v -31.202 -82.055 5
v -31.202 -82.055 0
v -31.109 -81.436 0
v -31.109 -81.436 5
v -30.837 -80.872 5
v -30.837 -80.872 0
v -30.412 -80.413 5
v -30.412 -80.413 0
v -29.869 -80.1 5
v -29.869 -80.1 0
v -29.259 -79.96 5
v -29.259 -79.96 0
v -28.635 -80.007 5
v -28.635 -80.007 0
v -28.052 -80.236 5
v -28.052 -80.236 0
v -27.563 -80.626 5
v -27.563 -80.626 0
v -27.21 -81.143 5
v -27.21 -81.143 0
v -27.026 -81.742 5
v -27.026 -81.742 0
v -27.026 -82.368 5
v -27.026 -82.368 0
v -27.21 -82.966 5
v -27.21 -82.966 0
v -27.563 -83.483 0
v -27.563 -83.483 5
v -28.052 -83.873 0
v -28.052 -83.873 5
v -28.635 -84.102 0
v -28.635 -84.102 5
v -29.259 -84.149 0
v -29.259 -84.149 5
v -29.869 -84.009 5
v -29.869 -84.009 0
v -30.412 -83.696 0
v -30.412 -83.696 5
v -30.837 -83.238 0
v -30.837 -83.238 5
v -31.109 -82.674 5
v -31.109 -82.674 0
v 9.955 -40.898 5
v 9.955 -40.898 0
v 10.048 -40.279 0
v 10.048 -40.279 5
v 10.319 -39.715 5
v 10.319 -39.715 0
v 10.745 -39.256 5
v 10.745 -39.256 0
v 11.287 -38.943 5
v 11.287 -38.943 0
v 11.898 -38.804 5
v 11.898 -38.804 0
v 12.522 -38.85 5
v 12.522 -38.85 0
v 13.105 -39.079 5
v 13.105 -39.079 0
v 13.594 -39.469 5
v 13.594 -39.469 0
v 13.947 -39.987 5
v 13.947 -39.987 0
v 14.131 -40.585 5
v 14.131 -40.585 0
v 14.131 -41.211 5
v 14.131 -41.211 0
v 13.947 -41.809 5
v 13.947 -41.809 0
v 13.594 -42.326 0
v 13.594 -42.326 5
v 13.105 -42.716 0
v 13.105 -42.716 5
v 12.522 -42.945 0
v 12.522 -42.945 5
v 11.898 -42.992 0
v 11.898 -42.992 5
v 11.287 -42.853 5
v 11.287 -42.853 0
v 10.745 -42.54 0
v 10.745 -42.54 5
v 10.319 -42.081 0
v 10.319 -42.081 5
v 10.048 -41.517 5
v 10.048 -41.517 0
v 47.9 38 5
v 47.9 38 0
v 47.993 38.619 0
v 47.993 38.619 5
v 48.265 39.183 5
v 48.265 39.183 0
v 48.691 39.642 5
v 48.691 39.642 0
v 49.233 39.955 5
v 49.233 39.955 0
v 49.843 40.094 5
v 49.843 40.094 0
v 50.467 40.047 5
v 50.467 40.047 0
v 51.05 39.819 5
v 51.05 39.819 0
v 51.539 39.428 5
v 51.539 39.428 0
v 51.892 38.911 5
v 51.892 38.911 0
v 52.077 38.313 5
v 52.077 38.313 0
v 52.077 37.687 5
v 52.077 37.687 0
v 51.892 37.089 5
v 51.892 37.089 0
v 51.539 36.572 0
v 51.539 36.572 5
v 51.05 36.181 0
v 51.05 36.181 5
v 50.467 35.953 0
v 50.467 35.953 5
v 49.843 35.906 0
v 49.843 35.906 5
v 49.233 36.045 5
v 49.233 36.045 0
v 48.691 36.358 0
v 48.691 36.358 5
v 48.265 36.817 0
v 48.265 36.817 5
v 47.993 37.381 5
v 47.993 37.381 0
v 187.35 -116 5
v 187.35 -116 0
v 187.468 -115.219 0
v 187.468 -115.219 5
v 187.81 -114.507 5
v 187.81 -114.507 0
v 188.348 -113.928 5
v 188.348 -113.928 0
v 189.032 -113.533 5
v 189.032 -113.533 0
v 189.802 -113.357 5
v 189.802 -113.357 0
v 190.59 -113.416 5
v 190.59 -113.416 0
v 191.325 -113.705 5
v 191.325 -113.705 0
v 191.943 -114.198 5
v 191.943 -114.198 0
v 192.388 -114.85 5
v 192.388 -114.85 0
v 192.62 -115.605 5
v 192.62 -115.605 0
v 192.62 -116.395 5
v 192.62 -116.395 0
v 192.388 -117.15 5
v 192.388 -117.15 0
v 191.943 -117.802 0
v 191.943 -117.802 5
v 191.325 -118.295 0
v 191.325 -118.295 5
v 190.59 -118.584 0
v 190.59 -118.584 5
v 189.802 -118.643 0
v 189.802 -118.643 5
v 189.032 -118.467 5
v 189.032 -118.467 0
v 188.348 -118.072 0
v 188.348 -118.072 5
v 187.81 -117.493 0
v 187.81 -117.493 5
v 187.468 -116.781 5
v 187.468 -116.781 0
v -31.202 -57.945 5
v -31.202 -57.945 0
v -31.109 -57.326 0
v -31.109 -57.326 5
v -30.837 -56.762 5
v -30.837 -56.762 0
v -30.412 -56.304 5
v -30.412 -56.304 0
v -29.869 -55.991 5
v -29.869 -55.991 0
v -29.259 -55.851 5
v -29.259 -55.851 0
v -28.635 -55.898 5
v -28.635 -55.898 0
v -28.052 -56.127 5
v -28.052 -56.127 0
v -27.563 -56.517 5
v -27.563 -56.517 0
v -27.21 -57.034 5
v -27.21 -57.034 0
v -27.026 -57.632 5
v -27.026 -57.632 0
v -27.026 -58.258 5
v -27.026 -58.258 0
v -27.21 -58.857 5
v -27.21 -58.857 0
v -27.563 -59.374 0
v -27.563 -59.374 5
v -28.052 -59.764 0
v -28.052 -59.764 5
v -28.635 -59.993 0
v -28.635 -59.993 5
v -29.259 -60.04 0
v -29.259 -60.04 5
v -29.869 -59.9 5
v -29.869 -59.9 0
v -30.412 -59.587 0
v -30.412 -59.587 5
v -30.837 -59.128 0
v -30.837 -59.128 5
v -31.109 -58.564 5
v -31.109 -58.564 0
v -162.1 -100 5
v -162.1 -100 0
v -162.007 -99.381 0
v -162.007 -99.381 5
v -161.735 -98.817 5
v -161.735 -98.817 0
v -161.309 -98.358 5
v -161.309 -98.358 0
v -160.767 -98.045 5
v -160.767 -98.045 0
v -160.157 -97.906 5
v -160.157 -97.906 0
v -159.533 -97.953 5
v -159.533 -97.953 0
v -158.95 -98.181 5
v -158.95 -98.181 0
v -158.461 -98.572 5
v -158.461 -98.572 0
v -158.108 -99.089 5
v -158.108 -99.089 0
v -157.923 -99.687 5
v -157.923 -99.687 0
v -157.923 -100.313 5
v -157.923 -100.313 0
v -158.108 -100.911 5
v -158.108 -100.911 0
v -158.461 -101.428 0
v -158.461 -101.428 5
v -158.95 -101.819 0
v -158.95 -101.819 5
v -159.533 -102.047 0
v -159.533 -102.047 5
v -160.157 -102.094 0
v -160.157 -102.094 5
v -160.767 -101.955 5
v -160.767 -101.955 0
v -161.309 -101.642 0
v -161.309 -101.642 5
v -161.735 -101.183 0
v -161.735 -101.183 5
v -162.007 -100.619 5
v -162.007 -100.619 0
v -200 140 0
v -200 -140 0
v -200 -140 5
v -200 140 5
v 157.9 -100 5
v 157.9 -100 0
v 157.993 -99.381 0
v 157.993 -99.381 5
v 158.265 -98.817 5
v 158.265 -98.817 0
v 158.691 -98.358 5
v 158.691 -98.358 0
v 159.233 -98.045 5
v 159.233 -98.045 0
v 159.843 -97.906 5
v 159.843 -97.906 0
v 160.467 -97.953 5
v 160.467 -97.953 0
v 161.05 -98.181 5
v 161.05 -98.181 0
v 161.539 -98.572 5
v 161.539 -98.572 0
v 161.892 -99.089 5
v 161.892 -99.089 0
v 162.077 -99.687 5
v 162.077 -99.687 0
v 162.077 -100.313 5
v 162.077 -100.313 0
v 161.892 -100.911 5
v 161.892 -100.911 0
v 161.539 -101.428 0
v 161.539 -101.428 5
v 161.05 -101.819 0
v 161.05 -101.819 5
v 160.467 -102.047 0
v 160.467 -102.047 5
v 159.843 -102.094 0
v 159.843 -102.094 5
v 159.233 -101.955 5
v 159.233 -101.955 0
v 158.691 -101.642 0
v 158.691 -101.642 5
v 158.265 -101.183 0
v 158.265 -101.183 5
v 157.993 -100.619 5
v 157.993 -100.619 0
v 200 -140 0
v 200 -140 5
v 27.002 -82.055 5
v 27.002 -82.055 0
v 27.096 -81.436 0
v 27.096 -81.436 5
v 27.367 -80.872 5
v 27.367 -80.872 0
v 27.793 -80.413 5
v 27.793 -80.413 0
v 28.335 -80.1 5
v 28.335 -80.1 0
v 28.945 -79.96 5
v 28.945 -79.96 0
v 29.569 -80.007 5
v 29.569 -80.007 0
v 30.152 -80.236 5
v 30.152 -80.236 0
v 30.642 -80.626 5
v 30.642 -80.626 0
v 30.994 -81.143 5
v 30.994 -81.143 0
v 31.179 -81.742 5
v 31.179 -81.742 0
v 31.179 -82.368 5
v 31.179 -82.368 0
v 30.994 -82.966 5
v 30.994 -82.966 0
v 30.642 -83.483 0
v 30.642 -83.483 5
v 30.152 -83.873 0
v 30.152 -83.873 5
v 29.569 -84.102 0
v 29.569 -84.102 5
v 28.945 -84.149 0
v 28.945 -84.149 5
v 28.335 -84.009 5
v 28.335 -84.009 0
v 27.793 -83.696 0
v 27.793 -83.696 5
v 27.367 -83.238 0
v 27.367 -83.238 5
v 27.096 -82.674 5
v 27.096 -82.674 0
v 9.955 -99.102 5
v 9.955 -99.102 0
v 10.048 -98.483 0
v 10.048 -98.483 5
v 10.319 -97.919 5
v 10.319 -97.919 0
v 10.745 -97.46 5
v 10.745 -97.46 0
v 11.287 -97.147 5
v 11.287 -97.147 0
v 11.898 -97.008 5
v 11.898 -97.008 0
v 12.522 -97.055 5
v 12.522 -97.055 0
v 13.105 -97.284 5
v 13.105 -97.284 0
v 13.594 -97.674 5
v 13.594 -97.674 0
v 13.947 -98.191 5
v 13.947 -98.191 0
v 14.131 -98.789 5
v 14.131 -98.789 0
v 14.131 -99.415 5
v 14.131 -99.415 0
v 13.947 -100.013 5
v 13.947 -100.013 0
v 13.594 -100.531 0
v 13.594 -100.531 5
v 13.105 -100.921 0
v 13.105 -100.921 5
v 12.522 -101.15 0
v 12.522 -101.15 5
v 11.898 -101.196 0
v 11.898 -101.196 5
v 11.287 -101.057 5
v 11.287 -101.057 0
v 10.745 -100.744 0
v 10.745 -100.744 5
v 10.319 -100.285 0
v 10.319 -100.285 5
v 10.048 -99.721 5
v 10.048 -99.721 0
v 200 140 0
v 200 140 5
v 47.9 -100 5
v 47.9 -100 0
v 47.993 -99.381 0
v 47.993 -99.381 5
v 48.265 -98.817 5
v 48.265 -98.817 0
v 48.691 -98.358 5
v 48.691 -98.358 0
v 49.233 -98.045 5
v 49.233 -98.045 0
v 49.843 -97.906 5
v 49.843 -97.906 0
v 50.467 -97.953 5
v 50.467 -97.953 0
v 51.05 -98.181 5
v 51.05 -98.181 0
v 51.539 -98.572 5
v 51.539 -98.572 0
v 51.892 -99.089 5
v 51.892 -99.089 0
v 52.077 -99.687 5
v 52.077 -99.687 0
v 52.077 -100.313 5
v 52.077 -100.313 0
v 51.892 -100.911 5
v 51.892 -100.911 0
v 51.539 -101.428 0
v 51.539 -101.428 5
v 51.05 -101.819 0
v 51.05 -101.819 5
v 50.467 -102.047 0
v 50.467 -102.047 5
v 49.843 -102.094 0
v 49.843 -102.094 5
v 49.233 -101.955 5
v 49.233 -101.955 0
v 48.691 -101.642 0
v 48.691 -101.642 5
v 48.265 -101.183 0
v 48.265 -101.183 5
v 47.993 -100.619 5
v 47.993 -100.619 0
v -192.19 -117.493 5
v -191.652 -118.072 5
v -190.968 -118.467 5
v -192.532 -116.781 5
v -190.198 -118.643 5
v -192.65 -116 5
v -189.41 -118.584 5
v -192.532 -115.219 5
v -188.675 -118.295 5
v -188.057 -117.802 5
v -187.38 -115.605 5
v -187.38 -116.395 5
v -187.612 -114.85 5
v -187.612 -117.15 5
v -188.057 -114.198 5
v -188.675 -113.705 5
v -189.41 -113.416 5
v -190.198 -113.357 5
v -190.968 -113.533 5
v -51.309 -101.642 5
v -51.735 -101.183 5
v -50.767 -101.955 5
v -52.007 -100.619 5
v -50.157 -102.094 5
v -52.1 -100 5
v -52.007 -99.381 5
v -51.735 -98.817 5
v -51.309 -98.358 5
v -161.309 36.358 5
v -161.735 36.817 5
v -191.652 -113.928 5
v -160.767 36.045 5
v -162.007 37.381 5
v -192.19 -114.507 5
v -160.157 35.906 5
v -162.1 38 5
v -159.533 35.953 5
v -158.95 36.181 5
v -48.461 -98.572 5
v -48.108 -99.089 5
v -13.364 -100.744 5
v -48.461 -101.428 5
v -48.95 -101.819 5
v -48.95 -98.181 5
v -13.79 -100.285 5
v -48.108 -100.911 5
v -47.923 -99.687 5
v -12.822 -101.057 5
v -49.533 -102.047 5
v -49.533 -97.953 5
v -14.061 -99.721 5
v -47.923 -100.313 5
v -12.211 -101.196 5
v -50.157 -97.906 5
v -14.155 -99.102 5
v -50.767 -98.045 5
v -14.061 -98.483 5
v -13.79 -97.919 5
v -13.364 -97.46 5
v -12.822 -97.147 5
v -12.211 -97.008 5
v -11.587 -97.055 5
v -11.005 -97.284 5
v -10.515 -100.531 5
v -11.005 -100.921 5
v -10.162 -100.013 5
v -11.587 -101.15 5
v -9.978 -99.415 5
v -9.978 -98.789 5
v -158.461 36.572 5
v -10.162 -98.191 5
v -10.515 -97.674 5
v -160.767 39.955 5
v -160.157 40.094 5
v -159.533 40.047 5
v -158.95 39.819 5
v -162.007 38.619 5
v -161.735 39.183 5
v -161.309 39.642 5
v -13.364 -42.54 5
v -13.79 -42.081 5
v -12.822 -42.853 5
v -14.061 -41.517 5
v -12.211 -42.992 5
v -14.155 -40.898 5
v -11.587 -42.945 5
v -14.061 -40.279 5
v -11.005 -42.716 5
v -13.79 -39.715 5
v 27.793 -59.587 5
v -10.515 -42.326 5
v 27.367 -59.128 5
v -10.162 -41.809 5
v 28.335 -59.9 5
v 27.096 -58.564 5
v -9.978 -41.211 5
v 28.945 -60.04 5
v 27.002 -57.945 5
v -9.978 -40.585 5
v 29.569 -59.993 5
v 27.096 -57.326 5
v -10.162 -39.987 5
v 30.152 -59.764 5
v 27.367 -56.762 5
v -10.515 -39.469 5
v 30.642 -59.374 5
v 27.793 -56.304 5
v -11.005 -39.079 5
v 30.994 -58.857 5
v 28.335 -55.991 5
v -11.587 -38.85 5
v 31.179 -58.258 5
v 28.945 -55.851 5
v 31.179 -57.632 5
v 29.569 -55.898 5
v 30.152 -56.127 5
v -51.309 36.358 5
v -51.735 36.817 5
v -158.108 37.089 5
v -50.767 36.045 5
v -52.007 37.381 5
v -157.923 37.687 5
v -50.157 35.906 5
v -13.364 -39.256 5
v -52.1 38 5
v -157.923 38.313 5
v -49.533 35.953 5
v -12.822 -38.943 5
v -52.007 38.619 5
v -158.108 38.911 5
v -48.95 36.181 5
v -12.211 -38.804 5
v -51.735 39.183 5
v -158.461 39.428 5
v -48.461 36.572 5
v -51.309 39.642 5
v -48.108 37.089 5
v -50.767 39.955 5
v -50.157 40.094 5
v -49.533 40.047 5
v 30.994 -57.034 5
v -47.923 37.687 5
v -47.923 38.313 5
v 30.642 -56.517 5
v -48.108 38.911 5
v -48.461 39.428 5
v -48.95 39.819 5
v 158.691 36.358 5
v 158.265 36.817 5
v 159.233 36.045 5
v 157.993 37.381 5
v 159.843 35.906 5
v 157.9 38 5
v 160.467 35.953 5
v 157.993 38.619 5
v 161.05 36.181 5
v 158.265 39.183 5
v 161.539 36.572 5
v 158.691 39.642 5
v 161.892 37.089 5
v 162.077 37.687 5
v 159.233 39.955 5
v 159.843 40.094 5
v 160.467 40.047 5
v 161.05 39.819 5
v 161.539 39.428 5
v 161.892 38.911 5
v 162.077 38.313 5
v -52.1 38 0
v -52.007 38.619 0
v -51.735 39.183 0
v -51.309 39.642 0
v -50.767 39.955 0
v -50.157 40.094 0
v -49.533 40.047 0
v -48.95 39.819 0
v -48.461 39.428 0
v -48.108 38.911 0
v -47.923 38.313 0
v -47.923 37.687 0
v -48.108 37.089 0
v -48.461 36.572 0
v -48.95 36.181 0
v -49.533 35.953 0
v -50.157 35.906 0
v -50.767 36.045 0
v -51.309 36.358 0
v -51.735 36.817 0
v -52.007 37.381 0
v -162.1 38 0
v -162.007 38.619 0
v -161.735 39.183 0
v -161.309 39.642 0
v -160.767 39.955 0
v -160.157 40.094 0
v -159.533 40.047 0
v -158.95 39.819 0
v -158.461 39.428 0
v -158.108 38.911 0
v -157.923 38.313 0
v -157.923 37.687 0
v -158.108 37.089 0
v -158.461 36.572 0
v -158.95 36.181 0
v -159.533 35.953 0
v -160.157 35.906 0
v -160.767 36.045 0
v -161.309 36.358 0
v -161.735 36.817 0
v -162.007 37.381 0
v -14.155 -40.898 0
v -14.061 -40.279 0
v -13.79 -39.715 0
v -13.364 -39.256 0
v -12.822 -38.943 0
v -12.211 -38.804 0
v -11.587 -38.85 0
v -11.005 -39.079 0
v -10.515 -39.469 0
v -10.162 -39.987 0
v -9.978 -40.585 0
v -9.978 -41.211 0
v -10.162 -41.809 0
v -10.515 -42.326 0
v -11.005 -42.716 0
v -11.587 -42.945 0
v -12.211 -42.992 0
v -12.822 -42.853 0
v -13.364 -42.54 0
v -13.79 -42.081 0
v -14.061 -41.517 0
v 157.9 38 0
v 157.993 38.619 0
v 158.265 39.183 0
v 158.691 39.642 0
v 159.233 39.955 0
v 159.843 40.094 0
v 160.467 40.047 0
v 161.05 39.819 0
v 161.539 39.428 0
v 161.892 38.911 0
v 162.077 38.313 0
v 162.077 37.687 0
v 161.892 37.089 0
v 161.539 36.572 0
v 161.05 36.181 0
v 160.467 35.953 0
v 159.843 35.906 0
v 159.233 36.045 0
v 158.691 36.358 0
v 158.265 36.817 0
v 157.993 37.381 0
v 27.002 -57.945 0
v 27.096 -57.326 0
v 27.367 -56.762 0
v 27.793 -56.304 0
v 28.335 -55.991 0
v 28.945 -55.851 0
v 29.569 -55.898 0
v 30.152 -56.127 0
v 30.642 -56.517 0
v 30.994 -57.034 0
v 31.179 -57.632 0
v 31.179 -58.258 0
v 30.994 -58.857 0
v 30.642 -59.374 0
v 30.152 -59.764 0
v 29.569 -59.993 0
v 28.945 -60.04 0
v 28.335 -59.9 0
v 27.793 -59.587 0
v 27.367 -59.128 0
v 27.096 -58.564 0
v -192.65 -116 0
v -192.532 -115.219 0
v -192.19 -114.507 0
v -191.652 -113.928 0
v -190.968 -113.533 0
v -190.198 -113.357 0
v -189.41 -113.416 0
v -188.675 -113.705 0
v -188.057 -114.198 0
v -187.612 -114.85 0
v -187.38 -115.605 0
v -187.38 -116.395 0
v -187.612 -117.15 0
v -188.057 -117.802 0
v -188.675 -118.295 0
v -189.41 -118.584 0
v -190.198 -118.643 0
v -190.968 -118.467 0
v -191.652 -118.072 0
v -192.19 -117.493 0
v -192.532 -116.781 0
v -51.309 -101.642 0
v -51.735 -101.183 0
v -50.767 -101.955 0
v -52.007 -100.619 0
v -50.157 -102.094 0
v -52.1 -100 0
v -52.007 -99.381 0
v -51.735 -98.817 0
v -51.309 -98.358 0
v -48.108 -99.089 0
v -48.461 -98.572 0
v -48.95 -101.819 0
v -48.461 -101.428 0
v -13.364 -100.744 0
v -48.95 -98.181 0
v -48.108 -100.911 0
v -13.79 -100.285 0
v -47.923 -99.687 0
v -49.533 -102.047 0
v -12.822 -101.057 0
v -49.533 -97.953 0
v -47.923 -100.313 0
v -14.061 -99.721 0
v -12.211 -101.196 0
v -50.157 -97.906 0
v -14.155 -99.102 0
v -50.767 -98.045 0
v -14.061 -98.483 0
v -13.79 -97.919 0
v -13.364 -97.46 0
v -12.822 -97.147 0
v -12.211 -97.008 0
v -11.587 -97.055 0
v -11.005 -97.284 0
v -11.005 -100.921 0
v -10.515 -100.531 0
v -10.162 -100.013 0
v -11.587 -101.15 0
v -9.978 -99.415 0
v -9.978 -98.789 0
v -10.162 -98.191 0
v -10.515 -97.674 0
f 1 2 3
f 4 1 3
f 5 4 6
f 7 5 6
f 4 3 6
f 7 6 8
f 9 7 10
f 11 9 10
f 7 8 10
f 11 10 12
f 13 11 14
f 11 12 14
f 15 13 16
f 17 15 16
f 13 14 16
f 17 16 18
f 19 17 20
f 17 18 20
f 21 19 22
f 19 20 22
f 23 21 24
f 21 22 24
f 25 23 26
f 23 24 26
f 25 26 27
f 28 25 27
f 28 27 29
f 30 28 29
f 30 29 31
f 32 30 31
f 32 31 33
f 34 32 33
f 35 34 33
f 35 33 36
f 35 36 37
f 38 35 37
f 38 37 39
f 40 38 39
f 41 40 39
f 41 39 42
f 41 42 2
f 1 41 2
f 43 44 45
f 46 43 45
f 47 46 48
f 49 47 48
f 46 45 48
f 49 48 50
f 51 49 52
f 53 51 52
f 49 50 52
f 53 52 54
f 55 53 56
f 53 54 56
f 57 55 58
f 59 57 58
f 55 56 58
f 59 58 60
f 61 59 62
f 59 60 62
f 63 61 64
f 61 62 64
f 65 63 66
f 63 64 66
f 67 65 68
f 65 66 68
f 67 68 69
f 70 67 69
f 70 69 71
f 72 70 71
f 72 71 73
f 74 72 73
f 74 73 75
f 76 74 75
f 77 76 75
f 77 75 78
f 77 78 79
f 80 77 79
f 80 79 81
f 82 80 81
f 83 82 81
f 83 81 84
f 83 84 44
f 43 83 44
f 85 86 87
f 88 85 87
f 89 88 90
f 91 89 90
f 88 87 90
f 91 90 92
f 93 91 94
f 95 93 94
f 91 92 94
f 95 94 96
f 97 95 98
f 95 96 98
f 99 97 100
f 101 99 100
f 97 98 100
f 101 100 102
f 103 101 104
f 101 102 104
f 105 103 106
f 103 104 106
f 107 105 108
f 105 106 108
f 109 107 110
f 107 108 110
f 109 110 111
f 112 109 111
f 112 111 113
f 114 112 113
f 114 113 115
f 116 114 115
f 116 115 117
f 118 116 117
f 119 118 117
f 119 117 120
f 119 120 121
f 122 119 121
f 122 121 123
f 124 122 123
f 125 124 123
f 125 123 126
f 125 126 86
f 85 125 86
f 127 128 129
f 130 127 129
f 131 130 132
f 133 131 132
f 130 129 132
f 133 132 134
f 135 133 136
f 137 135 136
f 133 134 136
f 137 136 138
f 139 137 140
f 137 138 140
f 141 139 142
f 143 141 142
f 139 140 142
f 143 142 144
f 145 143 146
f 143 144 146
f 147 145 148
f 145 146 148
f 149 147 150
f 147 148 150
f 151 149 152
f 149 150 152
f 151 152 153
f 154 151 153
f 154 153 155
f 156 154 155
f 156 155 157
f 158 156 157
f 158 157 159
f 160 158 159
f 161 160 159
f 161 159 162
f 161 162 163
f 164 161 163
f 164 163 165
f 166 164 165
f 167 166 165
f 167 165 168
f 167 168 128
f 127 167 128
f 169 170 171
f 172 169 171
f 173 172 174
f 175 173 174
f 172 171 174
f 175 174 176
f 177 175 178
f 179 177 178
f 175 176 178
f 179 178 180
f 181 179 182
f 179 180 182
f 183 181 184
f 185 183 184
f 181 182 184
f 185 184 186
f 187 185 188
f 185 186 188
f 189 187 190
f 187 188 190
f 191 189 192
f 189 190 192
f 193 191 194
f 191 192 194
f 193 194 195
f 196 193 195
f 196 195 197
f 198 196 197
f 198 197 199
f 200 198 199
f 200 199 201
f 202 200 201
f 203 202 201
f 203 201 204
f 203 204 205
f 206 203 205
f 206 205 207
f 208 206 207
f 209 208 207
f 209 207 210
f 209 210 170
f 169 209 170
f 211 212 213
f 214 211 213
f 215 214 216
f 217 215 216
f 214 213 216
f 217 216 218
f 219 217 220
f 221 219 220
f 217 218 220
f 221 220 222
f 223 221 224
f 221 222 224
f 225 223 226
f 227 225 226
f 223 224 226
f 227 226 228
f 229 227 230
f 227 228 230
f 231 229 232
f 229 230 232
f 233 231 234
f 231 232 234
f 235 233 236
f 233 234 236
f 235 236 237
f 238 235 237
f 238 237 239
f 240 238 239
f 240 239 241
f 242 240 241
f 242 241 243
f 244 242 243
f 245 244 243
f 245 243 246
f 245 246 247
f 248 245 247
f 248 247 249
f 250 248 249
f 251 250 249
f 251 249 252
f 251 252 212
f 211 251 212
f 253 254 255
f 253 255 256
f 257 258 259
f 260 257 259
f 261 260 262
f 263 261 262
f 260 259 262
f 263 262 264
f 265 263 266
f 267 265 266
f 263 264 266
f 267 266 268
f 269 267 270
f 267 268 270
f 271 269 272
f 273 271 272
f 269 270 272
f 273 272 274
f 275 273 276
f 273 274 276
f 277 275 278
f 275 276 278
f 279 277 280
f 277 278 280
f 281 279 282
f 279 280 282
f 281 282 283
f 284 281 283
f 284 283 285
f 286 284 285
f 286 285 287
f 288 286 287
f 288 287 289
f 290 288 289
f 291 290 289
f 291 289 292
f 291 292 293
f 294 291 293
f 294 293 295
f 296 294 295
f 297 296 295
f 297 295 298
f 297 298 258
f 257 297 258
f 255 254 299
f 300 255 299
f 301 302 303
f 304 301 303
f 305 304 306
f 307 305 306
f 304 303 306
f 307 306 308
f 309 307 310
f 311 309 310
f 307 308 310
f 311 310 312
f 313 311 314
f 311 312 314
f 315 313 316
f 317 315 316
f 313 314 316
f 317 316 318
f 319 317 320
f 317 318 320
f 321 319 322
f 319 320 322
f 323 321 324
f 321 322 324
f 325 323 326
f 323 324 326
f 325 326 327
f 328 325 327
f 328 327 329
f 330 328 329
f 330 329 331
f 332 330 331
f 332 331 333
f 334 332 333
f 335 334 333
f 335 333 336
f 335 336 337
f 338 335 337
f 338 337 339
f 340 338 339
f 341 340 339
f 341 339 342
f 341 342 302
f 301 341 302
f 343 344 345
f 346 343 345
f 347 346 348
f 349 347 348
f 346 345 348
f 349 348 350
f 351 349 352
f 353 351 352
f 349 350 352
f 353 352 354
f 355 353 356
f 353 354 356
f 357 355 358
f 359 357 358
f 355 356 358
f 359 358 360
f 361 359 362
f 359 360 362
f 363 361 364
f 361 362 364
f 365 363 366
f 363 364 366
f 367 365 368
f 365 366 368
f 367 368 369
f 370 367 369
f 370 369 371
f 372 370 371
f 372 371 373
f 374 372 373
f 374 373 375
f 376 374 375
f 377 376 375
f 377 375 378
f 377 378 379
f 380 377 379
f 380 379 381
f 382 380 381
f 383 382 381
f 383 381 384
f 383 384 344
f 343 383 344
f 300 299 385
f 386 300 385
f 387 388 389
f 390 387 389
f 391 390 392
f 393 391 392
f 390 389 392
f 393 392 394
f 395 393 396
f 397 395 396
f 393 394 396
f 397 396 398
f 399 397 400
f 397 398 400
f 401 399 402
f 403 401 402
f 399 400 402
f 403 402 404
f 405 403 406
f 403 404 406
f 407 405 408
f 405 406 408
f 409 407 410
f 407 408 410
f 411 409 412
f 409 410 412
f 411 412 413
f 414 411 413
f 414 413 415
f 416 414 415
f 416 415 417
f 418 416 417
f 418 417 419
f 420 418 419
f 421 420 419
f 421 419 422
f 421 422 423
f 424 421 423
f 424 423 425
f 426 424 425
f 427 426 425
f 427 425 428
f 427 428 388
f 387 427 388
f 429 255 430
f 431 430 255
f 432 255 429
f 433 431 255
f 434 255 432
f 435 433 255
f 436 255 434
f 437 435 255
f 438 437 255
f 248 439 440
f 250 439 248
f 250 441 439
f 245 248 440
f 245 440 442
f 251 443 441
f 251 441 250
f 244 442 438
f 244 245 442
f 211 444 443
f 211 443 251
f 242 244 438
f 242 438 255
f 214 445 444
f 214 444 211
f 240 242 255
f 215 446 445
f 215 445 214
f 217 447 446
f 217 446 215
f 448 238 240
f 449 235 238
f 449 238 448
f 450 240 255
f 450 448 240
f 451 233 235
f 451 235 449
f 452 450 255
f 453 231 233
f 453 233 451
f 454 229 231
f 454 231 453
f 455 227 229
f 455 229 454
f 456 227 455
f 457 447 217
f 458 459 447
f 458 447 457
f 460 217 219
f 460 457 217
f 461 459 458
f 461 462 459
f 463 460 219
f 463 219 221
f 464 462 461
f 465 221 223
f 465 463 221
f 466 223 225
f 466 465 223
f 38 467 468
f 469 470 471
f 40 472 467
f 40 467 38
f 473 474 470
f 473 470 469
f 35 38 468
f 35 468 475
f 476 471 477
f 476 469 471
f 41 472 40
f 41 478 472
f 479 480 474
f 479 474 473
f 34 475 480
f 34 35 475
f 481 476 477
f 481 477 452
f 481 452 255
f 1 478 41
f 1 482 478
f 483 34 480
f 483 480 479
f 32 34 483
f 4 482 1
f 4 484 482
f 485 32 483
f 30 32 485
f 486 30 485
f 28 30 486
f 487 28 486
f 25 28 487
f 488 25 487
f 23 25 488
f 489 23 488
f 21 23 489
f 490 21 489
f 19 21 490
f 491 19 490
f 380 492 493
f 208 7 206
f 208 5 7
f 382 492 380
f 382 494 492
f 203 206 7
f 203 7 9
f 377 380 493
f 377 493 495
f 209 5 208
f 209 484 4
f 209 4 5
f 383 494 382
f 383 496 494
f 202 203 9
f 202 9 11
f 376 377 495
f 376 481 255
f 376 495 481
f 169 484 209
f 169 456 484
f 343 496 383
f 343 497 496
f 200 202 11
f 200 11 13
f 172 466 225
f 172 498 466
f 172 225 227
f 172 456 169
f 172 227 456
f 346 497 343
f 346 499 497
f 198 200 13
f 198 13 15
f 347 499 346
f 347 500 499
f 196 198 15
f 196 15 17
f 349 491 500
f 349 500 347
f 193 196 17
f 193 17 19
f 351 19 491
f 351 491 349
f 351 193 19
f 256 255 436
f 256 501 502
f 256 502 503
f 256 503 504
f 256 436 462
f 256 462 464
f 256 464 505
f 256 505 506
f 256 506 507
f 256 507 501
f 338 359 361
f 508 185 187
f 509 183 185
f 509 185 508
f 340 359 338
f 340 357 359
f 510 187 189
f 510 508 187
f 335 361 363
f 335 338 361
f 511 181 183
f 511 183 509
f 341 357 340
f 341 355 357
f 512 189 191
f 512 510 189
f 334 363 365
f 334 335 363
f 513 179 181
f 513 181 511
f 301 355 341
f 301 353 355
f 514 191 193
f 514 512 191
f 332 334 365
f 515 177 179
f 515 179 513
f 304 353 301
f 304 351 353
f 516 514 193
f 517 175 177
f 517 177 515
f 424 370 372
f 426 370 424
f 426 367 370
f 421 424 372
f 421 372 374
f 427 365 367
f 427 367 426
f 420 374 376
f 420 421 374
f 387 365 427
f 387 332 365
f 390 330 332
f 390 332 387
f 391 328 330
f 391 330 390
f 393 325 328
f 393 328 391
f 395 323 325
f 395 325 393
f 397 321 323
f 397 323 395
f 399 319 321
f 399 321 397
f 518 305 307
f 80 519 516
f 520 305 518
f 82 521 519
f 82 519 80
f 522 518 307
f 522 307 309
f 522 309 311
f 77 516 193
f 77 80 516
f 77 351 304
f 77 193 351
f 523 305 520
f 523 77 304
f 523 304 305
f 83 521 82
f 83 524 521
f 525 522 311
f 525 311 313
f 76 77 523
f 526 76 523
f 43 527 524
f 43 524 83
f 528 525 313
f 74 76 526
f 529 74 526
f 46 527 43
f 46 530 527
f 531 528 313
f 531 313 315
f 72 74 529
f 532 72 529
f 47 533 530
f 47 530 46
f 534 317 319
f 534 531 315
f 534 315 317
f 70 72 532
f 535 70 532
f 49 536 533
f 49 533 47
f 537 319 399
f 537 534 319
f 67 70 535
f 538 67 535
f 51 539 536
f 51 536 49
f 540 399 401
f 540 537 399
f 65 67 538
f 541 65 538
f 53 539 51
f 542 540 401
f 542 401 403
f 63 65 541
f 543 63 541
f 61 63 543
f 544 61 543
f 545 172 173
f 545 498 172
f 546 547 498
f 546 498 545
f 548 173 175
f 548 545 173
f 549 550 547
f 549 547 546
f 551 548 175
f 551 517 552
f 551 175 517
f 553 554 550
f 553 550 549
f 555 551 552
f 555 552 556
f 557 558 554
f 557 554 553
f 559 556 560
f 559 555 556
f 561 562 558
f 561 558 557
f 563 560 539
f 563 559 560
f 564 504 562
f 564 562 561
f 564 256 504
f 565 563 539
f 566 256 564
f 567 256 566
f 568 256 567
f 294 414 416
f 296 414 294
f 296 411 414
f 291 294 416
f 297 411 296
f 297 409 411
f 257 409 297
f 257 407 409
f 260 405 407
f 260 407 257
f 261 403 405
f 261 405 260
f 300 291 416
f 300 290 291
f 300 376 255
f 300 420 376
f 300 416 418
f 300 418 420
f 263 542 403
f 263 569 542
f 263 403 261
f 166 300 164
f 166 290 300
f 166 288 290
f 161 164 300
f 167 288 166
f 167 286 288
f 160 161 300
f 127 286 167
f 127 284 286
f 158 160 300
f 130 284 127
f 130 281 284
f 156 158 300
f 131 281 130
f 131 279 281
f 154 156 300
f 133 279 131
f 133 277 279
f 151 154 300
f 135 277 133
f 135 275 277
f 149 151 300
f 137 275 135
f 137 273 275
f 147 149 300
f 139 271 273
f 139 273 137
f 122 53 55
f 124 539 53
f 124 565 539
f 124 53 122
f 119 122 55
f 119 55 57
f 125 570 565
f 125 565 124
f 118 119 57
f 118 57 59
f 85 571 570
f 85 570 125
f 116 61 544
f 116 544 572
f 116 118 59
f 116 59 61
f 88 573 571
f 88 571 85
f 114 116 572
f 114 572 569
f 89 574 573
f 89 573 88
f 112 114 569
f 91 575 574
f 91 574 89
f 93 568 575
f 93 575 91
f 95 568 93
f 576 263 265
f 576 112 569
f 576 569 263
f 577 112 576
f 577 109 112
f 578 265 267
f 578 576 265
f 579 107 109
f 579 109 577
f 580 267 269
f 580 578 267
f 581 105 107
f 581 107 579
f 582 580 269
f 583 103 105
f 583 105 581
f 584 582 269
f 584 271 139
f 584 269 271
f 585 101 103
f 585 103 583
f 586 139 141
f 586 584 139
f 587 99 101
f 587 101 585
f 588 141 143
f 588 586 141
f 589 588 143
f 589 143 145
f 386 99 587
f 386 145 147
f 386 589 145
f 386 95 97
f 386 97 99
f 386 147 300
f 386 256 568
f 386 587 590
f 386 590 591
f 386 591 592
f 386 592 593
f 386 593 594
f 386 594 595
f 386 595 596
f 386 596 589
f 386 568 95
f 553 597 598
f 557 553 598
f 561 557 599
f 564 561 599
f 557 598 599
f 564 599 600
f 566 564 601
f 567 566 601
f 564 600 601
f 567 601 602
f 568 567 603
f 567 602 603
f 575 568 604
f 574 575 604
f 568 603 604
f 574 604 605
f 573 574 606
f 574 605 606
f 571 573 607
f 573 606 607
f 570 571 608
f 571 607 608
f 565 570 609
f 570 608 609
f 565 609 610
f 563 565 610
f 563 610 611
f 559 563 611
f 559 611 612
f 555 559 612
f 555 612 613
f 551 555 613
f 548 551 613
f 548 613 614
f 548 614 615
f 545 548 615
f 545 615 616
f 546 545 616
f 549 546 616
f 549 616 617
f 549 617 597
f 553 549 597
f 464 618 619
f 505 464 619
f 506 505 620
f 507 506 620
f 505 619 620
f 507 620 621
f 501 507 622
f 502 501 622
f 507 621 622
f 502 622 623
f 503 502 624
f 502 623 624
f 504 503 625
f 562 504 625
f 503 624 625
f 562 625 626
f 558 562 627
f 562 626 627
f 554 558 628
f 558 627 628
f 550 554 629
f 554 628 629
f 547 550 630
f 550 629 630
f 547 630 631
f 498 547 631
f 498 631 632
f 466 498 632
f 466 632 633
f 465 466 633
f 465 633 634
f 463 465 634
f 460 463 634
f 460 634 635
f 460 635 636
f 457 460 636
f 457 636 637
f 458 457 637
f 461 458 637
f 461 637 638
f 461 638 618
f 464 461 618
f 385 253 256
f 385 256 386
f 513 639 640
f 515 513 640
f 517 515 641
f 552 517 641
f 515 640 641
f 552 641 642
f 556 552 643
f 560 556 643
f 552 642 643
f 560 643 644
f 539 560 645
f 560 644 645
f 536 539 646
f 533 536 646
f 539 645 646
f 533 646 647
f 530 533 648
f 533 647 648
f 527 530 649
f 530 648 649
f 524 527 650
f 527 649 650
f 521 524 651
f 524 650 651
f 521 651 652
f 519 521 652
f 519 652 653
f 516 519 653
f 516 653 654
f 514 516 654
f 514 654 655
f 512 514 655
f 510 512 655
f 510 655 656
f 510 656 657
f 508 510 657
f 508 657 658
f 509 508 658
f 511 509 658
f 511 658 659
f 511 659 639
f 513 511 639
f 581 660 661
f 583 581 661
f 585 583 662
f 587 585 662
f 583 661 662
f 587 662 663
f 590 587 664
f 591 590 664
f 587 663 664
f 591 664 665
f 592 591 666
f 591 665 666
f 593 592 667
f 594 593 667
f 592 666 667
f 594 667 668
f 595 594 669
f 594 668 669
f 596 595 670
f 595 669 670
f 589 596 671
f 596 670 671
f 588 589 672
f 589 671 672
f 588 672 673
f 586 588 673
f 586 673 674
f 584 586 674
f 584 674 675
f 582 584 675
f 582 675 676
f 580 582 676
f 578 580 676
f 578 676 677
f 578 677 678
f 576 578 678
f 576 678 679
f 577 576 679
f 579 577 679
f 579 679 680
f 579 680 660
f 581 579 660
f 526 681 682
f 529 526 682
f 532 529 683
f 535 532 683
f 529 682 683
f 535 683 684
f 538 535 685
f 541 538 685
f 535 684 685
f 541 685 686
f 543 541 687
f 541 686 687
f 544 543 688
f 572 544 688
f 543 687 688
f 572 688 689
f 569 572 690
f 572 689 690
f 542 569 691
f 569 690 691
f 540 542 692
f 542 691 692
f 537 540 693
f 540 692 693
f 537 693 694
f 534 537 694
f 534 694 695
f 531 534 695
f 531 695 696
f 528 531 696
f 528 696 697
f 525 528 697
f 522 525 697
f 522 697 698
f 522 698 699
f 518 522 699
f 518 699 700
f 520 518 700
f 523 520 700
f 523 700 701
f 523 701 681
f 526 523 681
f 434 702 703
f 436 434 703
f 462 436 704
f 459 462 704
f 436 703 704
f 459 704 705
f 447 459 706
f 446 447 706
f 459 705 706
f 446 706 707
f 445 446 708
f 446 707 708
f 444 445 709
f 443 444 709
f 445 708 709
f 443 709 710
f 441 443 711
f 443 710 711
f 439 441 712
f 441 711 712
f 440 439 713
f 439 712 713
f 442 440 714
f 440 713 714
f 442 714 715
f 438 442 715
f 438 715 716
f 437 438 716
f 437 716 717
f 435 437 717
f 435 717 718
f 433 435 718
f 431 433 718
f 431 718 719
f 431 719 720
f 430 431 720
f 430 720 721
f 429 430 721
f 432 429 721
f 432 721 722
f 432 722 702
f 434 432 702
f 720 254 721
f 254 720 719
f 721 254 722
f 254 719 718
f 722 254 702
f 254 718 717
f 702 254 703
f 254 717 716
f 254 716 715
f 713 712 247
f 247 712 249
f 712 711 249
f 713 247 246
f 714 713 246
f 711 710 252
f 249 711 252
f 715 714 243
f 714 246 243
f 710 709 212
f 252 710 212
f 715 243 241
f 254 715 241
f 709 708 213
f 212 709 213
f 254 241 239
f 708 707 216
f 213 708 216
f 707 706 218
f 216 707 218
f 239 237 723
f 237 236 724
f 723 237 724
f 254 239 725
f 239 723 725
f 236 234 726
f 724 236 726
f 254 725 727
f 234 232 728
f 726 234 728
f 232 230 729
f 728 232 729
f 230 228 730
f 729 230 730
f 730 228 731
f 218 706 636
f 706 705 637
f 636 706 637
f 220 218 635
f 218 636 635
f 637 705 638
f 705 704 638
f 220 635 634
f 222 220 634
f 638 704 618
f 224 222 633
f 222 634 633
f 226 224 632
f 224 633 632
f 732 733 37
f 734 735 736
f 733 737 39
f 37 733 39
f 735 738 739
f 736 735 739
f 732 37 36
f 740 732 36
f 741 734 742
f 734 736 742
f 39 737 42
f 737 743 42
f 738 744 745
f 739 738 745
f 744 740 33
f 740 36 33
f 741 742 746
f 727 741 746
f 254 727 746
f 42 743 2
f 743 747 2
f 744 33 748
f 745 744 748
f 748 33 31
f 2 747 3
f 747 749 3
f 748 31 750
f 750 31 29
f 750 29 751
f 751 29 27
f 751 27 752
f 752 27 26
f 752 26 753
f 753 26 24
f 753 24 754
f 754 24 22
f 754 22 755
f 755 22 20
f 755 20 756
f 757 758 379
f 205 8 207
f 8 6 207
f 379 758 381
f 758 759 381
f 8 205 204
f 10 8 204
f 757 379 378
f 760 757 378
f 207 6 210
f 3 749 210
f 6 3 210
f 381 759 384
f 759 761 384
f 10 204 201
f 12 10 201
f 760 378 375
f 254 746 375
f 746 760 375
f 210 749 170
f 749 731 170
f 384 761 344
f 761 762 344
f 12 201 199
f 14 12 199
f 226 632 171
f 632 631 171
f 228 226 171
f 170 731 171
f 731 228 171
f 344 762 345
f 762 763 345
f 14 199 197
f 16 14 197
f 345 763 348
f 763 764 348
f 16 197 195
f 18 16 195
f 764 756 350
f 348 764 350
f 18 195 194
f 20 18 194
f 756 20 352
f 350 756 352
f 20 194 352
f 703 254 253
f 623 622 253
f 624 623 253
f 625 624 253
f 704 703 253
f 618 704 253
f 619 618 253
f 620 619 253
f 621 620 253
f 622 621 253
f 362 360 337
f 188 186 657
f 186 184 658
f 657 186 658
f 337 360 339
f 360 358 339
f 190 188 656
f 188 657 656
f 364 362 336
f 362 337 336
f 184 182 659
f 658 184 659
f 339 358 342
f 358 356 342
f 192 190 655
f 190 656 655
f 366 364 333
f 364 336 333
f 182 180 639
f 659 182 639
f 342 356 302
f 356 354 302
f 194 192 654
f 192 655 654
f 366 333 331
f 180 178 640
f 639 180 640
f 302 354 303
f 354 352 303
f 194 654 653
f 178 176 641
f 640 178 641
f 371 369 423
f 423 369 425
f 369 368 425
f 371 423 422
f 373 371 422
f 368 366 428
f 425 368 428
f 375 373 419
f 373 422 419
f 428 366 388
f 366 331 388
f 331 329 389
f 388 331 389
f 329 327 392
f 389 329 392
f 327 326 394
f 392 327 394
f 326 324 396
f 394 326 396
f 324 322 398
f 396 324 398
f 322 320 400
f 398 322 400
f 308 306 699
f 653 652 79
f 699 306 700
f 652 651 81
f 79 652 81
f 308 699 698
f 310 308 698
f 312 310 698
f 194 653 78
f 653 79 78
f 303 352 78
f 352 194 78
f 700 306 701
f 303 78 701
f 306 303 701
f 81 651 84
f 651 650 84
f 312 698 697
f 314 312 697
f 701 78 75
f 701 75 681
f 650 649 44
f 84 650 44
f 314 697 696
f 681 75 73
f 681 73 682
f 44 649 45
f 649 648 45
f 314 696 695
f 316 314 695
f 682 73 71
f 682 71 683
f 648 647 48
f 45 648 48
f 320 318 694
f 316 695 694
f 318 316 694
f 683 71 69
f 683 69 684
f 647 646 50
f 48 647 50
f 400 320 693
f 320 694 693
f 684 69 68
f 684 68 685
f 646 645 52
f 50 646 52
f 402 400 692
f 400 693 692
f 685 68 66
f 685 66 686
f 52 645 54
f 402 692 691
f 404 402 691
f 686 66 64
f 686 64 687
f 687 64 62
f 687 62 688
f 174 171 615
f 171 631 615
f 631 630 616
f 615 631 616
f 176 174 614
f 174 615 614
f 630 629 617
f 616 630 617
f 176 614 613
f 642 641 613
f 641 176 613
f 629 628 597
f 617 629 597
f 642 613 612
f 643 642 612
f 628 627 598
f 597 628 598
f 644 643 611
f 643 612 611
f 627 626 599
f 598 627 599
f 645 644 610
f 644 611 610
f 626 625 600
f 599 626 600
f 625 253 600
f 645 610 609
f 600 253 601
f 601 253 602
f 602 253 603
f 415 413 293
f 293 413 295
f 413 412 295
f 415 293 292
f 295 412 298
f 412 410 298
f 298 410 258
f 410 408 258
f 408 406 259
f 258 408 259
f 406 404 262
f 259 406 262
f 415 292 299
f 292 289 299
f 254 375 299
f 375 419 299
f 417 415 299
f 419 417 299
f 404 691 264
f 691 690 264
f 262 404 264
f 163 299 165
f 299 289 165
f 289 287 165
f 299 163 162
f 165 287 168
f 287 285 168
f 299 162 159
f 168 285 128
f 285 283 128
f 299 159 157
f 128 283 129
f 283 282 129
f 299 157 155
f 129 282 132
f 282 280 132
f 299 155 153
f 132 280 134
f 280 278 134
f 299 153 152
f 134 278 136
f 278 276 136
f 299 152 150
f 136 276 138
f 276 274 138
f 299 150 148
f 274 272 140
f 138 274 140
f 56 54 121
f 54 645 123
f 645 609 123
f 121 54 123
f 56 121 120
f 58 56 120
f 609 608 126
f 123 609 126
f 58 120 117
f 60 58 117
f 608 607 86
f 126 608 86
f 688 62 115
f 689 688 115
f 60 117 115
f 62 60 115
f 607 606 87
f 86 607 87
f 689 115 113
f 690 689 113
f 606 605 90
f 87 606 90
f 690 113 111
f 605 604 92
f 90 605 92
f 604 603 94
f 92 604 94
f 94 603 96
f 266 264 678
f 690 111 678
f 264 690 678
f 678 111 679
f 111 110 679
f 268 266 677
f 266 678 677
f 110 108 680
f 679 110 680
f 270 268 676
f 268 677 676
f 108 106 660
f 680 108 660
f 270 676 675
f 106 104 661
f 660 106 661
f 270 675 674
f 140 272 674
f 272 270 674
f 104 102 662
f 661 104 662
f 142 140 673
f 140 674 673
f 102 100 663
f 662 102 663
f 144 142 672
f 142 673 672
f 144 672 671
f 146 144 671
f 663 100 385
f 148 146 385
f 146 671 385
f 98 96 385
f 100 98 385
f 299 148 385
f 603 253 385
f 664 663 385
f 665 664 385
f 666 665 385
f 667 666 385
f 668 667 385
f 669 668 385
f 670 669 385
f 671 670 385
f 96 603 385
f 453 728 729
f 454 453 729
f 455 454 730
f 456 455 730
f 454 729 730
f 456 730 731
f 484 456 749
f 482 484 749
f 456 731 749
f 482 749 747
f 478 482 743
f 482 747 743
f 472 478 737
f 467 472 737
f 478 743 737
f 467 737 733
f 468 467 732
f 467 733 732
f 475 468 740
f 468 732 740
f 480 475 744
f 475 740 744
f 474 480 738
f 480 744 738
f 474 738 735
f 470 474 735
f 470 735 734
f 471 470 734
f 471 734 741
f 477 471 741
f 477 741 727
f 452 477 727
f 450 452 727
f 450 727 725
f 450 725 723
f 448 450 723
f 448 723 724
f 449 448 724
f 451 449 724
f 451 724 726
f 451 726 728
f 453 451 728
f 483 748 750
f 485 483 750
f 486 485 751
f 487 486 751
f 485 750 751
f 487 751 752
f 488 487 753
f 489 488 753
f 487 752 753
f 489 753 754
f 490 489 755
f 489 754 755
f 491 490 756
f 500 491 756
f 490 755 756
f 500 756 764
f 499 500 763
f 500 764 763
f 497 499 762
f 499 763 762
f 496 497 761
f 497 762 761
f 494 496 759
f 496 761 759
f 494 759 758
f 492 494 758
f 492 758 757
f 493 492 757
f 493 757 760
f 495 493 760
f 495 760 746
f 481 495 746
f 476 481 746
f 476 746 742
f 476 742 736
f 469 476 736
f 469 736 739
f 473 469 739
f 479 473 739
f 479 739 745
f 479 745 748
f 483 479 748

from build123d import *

# Parameters (mm, degrees)
ESBO_O1_W                    = 400
ESBO_O1_H                    = 280
RESSALTO_EXTRUS_O1_DEPTH     = 5
FURO_DE_DI_METRO_4_2_4_2_2_D = 4.2
FURO_DE_DI_METRO_5_3_5_3_1_D = 5.3
FURO_DE_DI_METRO_4_2_4_2_1_D = 4.2


with BuildPart() as part:
    # Esboço1 → Ressalto-extrusão1 (new body)
    with BuildSketch(Plane.XY):
        Rectangle(ESBO_O1_W, ESBO_O1_H)
    extrude(amount=RESSALTO_EXTRUS_O1_DEPTH)

    # Furo de diâmetro Ø4.2 (4.2)2 (through all)
    with Locations(Plane(origin=(12.05452812, -40.897794726, 5), x_dir=(1, 0, 0), z_dir=(0, 0, 1))):
        with Locations((0, 0), (17.047677154, -17.047677154), (17.047677154, -41.156733393), (0, -58.204410548), (-24.109056239, -58.204410548), (-41.156733394, -41.156733394), (-41.156733394, -17.047677155), (-24.109056239, 0)):
            Hole(FURO_DE_DI_METRO_4_2_4_2_2_D / 2)

    # Furo de diâmetro Ø5.3 (5.3)1 (through all)
    with Locations(Plane(origin=(-190, -116, 5), x_dir=(1, 0, 0), z_dir=(0, 0, 1))):
        with Locations((0, 0), (380, 0)):
            Hole(FURO_DE_DI_METRO_5_3_5_3_1_D / 2)

    # Furo de diâmetro Ø4.2 (4.2)1 (through all)
    with Locations(Plane(origin=(-160, 38, 5), x_dir=(1, 0, 0), z_dir=(0, 0, 1))):
        with Locations((0, 0), (110, 0), (210, 0), (320, 0), (320, -138), (210, -138), (110, -138), (0, -138)):
            Hole(FURO_DE_DI_METRO_4_2_4_2_1_D / 2)


solid = part.part
